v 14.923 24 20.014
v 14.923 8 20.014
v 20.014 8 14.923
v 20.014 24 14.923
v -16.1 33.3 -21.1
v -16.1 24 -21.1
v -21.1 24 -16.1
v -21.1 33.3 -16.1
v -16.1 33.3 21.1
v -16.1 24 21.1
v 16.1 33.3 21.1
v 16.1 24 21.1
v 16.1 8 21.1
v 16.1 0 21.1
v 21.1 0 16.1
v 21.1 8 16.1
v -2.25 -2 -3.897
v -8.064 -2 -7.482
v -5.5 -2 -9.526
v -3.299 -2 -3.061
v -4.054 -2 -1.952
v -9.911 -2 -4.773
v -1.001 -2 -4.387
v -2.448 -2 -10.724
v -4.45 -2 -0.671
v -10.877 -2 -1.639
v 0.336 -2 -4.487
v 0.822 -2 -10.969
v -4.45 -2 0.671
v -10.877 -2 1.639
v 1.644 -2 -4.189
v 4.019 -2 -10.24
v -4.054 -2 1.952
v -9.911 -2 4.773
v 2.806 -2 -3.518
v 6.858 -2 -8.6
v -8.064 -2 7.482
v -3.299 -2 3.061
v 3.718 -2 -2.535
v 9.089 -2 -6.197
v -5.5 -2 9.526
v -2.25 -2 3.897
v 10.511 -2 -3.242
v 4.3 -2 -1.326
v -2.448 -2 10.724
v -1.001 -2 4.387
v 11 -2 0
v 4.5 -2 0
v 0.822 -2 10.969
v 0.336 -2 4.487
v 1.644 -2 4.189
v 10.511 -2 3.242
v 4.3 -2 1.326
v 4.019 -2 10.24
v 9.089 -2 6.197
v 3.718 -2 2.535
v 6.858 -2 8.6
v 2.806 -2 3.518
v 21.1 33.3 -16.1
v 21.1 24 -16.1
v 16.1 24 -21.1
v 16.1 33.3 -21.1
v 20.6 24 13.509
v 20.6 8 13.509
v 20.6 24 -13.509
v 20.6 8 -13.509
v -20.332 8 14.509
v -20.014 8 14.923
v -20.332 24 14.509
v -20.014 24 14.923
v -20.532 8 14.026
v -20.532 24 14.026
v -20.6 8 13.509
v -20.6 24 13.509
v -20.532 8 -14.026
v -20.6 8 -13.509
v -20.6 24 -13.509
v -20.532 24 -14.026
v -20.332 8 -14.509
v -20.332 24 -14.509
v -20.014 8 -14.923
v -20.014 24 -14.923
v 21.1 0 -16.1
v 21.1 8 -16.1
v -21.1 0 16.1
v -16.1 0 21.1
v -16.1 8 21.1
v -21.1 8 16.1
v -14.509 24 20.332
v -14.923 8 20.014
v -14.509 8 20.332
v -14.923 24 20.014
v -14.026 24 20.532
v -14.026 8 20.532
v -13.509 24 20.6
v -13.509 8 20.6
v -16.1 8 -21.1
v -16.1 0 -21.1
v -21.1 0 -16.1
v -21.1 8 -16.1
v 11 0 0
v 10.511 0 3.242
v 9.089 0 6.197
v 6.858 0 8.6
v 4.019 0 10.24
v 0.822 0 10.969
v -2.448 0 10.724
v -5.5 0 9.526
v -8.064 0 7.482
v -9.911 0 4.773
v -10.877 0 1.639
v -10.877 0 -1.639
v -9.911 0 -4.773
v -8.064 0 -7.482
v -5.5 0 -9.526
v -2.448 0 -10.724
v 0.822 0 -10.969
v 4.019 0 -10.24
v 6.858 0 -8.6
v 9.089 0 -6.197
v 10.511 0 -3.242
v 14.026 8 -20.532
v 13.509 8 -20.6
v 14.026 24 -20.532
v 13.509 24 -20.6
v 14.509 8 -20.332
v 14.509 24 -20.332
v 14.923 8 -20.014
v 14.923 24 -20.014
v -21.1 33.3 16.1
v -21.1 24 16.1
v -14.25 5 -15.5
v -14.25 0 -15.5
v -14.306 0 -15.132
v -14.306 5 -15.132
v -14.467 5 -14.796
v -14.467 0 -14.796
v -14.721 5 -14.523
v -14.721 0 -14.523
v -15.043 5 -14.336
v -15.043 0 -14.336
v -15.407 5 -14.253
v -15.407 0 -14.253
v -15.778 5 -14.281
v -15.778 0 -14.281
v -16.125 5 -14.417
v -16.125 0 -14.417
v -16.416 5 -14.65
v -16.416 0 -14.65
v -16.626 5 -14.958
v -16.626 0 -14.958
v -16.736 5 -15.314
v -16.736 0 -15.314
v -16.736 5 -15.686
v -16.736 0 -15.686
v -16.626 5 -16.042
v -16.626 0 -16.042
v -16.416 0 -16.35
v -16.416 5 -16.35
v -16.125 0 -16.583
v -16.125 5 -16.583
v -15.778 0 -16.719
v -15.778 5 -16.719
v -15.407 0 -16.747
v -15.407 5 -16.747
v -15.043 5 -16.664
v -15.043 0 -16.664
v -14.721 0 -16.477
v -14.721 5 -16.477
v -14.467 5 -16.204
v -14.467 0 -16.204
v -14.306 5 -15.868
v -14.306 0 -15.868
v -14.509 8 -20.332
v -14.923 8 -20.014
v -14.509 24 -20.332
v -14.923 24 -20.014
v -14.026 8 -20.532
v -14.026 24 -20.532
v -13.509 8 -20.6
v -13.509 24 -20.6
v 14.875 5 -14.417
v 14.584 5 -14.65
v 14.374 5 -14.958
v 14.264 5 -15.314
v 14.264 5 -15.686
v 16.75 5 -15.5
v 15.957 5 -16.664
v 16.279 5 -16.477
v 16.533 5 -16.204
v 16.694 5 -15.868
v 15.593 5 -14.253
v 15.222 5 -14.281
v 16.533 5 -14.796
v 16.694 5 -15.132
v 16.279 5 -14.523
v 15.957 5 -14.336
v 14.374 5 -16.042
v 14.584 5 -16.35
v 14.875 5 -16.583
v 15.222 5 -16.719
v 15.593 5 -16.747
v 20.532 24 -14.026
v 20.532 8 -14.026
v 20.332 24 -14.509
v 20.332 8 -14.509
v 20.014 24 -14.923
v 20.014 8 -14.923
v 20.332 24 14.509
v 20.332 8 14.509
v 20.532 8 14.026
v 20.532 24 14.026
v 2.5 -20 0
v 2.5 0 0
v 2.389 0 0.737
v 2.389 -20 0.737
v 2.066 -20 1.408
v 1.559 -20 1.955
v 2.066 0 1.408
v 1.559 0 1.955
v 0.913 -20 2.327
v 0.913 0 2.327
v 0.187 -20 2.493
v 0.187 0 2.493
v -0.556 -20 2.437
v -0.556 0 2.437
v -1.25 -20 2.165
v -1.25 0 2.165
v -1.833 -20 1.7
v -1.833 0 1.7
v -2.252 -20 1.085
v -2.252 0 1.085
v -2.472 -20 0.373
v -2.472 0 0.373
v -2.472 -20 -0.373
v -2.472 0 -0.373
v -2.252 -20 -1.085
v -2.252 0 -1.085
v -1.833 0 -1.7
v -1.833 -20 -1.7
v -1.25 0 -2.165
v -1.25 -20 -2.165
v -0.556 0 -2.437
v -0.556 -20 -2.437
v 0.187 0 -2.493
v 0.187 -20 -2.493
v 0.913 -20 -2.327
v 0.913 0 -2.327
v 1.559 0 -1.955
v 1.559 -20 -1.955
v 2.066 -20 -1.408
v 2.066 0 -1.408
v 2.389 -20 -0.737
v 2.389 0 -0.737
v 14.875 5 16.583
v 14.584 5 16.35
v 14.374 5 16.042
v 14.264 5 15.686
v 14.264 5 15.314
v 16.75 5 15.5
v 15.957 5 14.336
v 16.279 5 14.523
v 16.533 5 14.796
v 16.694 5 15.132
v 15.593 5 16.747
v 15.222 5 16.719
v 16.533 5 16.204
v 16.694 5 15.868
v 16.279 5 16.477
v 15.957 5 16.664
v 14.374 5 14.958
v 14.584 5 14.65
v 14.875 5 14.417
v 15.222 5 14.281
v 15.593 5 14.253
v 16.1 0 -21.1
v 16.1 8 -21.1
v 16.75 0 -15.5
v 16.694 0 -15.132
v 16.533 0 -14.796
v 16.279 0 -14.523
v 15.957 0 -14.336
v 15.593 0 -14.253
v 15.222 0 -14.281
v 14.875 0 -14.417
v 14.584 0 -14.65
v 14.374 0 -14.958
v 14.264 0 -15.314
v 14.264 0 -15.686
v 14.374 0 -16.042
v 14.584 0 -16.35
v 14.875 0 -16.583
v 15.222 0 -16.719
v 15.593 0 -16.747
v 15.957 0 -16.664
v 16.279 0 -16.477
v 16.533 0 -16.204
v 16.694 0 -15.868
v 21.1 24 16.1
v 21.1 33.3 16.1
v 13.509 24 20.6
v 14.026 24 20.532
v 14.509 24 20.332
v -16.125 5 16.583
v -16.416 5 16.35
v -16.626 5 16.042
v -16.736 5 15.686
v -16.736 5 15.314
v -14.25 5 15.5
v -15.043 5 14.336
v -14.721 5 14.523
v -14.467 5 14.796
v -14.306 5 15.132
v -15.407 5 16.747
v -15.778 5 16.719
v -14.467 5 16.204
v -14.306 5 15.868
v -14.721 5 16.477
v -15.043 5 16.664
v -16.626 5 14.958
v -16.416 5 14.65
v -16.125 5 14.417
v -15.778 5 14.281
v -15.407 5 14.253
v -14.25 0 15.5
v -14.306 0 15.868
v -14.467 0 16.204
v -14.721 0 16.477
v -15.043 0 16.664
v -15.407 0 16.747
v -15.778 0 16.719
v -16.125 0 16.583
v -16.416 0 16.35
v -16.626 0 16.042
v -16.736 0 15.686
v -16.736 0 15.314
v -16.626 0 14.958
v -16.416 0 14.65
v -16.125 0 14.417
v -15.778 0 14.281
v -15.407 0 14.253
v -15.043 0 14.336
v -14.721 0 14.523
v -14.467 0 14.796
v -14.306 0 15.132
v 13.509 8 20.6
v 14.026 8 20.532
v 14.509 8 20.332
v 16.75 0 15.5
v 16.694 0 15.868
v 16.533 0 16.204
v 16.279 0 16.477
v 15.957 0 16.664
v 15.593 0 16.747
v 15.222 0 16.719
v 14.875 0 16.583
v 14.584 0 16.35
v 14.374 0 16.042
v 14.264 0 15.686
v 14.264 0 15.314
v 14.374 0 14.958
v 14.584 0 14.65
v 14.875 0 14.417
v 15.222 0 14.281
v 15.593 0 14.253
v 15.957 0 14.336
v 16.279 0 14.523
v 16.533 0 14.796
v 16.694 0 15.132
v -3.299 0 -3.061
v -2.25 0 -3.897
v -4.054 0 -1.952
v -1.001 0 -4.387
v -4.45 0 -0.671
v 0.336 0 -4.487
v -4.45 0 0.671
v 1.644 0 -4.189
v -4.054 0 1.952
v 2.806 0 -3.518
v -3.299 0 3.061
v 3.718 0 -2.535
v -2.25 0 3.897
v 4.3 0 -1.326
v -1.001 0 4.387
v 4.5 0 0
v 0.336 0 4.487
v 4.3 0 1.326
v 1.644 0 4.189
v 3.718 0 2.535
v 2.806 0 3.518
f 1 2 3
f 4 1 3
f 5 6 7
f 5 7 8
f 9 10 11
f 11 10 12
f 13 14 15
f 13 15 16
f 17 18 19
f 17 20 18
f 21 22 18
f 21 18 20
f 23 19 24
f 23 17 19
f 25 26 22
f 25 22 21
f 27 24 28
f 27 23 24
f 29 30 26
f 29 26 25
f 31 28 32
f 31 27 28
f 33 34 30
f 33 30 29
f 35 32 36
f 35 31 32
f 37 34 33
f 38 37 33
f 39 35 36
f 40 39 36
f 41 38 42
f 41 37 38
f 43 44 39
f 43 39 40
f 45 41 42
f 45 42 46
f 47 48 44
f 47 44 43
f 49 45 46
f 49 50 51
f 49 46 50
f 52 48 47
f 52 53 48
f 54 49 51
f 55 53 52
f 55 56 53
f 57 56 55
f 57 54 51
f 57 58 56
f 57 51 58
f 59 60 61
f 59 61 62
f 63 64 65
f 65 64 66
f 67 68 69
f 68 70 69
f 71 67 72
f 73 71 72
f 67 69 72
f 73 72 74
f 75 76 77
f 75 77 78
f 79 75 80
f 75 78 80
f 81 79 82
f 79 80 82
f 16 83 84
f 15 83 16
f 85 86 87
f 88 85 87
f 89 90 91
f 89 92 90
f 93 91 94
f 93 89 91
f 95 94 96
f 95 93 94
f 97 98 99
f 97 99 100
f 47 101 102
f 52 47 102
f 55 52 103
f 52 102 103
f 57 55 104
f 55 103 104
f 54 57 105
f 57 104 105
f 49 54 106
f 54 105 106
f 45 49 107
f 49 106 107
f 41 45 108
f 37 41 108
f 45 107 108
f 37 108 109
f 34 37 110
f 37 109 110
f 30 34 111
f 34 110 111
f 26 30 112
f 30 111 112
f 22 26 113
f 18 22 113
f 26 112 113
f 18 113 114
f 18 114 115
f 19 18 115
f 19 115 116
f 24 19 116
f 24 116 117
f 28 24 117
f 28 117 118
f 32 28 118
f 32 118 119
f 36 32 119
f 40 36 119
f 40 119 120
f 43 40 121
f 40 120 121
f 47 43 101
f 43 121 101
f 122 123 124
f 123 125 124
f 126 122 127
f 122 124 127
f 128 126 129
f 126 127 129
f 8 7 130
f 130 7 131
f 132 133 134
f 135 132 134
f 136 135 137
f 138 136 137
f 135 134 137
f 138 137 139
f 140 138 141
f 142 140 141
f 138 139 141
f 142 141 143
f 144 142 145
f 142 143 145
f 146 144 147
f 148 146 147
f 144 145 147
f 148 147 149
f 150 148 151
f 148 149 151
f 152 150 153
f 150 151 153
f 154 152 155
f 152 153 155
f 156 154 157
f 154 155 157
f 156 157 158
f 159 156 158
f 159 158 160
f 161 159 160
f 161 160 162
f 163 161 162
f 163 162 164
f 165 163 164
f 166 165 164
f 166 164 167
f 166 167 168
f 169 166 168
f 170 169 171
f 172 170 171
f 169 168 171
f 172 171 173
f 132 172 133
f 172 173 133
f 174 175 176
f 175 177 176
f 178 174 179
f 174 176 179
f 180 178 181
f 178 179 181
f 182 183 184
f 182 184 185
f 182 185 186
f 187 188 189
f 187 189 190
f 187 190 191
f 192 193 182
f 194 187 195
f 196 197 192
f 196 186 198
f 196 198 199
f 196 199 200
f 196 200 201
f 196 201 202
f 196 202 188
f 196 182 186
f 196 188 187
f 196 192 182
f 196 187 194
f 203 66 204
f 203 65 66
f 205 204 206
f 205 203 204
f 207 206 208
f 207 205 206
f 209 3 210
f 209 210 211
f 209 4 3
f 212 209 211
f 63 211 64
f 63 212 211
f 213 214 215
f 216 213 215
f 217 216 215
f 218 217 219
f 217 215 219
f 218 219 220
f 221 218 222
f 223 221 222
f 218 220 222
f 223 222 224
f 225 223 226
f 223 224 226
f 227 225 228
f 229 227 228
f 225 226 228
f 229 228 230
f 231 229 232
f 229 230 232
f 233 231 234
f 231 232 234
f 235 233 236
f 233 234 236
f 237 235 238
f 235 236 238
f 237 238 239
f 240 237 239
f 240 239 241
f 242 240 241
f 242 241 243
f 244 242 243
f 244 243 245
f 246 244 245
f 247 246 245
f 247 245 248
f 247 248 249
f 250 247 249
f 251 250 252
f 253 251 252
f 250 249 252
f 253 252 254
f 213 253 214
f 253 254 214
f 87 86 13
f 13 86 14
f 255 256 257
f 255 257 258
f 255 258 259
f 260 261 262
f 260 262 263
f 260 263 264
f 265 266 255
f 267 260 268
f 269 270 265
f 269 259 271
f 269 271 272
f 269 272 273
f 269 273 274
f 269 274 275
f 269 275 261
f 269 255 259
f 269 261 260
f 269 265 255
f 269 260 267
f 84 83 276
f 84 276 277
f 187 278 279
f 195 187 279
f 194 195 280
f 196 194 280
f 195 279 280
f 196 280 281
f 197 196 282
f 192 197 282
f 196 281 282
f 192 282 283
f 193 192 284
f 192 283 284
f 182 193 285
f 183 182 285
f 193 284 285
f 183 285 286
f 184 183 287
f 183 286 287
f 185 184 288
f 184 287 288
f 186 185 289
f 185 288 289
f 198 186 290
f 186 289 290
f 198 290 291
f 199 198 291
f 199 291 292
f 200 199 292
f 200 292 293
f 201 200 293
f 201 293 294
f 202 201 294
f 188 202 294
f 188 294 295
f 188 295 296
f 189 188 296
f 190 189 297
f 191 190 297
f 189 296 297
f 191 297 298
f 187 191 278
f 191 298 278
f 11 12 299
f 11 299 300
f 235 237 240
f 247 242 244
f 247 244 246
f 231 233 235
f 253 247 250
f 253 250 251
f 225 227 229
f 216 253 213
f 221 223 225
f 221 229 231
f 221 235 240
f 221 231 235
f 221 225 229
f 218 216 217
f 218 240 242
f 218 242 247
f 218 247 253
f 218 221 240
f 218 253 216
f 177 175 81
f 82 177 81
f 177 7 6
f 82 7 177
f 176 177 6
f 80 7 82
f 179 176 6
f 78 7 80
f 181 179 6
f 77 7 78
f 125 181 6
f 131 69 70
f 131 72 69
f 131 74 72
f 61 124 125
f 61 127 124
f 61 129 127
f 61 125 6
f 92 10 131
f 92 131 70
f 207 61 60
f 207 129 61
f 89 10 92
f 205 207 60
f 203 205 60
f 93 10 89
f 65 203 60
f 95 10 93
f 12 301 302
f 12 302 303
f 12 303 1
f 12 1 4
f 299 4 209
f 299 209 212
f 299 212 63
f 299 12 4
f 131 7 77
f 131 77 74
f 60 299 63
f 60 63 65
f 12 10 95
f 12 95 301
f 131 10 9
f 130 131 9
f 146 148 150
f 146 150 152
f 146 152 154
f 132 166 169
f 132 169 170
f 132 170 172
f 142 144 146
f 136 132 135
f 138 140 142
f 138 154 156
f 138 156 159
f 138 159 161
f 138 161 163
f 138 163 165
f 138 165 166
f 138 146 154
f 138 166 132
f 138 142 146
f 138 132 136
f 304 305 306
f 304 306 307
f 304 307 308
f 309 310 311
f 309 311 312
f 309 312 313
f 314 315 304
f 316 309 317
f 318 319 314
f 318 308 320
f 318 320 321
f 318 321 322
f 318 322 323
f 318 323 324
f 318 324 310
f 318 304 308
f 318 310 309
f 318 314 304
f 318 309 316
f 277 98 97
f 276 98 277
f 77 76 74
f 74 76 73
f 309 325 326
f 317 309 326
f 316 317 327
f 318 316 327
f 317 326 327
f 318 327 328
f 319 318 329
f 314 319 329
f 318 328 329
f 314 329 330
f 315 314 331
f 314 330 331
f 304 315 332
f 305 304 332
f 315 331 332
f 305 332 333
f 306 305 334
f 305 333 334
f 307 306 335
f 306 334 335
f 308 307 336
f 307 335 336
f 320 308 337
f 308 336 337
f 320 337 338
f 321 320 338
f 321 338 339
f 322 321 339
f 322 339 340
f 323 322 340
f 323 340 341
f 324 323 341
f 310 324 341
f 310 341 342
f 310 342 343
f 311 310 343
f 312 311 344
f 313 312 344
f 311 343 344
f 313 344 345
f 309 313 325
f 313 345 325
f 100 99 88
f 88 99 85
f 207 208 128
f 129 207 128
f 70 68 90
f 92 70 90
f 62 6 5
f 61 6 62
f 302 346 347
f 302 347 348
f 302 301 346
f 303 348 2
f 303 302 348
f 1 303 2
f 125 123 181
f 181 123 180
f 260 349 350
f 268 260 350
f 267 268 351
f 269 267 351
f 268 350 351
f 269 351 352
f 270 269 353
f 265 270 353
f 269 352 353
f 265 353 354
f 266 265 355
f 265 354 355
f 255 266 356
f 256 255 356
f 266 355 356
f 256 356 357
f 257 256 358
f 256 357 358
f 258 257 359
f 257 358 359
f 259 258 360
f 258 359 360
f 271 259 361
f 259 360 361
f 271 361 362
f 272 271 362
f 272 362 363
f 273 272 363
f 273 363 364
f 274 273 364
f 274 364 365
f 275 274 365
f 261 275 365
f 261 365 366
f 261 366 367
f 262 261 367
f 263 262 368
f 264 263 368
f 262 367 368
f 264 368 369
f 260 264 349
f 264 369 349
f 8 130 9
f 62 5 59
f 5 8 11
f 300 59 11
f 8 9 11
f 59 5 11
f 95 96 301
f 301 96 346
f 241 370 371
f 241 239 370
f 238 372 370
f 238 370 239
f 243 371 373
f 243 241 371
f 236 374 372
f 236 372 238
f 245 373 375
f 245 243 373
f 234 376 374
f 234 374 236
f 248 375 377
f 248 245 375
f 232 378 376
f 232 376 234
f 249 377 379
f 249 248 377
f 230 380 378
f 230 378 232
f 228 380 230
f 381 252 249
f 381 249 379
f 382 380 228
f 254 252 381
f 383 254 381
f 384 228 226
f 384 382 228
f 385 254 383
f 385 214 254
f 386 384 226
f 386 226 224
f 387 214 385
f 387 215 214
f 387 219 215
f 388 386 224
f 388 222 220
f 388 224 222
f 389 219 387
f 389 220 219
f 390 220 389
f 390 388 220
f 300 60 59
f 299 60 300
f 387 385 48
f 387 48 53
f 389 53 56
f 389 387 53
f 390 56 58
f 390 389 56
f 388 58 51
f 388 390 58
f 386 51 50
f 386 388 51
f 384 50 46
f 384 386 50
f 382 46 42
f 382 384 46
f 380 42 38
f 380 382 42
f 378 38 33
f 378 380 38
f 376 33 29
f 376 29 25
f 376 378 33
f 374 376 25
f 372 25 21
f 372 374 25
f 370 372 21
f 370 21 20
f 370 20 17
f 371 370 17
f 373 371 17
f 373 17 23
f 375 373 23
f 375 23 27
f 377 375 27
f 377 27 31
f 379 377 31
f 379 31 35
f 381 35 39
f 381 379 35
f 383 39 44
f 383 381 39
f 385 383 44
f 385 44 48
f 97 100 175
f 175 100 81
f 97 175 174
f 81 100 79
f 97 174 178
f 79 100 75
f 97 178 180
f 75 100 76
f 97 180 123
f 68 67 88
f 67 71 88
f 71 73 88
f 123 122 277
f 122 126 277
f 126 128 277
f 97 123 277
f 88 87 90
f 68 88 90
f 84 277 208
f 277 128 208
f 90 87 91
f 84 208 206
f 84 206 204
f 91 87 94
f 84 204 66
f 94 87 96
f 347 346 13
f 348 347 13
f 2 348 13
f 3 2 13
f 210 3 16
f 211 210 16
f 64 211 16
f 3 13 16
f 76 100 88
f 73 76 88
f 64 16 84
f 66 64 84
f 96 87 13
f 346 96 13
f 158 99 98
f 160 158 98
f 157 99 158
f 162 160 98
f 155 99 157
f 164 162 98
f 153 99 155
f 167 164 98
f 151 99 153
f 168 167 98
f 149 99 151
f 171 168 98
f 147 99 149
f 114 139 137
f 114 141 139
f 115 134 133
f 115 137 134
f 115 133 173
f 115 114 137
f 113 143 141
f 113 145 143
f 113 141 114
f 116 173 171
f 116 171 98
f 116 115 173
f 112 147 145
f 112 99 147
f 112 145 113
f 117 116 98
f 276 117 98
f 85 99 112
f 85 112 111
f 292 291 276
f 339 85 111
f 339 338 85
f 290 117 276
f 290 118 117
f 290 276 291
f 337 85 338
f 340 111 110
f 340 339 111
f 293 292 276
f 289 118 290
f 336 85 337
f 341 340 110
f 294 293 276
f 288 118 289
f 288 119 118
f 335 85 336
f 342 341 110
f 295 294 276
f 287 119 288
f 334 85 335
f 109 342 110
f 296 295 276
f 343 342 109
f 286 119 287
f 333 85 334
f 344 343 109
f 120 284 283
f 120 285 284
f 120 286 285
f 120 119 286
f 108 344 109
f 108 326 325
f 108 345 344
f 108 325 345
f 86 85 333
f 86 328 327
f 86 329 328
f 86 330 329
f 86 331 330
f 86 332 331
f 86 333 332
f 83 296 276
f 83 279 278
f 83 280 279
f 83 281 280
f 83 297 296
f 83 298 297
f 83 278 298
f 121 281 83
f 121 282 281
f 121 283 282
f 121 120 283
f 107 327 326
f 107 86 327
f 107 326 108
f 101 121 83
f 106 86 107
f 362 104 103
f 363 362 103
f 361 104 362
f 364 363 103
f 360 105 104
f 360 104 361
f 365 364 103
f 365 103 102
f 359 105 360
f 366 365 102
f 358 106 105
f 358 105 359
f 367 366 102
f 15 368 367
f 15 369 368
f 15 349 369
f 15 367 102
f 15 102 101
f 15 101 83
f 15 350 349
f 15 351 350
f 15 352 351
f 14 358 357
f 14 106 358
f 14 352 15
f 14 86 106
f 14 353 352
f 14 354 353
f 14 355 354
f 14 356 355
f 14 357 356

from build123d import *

# Parameters (mm, degrees)
F0_W      = 42.2
F0_H      = 42.2
F0_R      = 2.5
F1_DEPTH  = 33.3
F2_SIZE   = 5
F3_DEPTH  = 20
F4_R      = 11
F4_R_2    = 4.5
F5_DEPTH  = 2
F6_R      = 1.25
F7_DEPTH  = 5
F9_W      = 50.7564134896
F9_H      = 50.1955691725
F10_DEPTH = 16
F11_R     = 2


with BuildPart() as f1:
    # F0 (on Front) → F1 (new body)
    with BuildSketch(Plane.XZ):
        Rectangle(F0_W, F0_H)
        Circle(F0_R, mode=Mode.SUBTRACT)
        Circle(F0_R)
    extrude(amount=-F1_DEPTH)

    # F2
    f2_edges = [f1.edges().sort_by_distance(p)[0] for p in [
        (21.1, 16.65, 21.1),
        (-21.1, 16.65, 21.1),
        (21.1, 16.65, -21.1),
        (-21.1, 16.65, -21.1),
    ]]
    chamfer(f2_edges, length=F2_SIZE)

    # F0 (on Front) → F3 (join)
    with BuildSketch(Plane.XZ):
        Circle(F0_R)
    extrude(amount=F3_DEPTH)

    # F4 (on face) → F5 (join)
    with BuildSketch(Plane.XZ):
        Circle(F4_R)
        Circle(F4_R_2, mode=Mode.SUBTRACT)
    extrude(amount=F5_DEPTH)

    # F6 (on face) → F7 (cut)
    with BuildSketch(Plane.XZ):
        with Locations((-15.5, 15.5)):
            Circle(F6_R)
        with Locations((-15.5, -15.5)):
            Circle(F6_R)
        with Locations((15.5, -15.5)):
            Circle(F6_R)
        with Locations((15.5, 15.5)):
            Circle(F6_R)
    extrude(amount=-F7_DEPTH, mode=Mode.SUBTRACT)

    # F9 (on offset) → F10 (cut)
    with BuildSketch(Plane.XZ.offset(-8)):
        with Locations((0.5305930972, 0.0707069412)):
            Rectangle(F9_W, F9_H)
        Polygon((-14.3372583002, 20.6), (0, 20.6), (14.3372583002, 20.6), (20.6, 14.3372583002), (20.6, 0), (20.6, -14.3372583002), (14.3372583002, -20.6), (0, -20.6), (-14.3372583002, -20.6), (-20.6, -14.3372583002), (-20.6, 0), (-20.6, 14.3372583002), align=None, mode=Mode.SUBTRACT)
    extrude(amount=-F10_DEPTH, mode=Mode.SUBTRACT)

    # F11
    f11_edges = [f1.edges().sort_by_distance(p)[0] for p in [
        (20.6, 16, 14.337258),
        (14.337258, 16, 20.6),
        (-14.337258, 16, 20.6),
        (-20.6, 16, 14.337258),
        (-20.6, 16, -14.337258),
        (-14.337258, 16, -20.6),
        (20.6, 16, -14.337258),
        (14.337258, 16, -20.6),
    ]]
    fillet(f11_edges, radius=F11_R)


solid = f1.part
